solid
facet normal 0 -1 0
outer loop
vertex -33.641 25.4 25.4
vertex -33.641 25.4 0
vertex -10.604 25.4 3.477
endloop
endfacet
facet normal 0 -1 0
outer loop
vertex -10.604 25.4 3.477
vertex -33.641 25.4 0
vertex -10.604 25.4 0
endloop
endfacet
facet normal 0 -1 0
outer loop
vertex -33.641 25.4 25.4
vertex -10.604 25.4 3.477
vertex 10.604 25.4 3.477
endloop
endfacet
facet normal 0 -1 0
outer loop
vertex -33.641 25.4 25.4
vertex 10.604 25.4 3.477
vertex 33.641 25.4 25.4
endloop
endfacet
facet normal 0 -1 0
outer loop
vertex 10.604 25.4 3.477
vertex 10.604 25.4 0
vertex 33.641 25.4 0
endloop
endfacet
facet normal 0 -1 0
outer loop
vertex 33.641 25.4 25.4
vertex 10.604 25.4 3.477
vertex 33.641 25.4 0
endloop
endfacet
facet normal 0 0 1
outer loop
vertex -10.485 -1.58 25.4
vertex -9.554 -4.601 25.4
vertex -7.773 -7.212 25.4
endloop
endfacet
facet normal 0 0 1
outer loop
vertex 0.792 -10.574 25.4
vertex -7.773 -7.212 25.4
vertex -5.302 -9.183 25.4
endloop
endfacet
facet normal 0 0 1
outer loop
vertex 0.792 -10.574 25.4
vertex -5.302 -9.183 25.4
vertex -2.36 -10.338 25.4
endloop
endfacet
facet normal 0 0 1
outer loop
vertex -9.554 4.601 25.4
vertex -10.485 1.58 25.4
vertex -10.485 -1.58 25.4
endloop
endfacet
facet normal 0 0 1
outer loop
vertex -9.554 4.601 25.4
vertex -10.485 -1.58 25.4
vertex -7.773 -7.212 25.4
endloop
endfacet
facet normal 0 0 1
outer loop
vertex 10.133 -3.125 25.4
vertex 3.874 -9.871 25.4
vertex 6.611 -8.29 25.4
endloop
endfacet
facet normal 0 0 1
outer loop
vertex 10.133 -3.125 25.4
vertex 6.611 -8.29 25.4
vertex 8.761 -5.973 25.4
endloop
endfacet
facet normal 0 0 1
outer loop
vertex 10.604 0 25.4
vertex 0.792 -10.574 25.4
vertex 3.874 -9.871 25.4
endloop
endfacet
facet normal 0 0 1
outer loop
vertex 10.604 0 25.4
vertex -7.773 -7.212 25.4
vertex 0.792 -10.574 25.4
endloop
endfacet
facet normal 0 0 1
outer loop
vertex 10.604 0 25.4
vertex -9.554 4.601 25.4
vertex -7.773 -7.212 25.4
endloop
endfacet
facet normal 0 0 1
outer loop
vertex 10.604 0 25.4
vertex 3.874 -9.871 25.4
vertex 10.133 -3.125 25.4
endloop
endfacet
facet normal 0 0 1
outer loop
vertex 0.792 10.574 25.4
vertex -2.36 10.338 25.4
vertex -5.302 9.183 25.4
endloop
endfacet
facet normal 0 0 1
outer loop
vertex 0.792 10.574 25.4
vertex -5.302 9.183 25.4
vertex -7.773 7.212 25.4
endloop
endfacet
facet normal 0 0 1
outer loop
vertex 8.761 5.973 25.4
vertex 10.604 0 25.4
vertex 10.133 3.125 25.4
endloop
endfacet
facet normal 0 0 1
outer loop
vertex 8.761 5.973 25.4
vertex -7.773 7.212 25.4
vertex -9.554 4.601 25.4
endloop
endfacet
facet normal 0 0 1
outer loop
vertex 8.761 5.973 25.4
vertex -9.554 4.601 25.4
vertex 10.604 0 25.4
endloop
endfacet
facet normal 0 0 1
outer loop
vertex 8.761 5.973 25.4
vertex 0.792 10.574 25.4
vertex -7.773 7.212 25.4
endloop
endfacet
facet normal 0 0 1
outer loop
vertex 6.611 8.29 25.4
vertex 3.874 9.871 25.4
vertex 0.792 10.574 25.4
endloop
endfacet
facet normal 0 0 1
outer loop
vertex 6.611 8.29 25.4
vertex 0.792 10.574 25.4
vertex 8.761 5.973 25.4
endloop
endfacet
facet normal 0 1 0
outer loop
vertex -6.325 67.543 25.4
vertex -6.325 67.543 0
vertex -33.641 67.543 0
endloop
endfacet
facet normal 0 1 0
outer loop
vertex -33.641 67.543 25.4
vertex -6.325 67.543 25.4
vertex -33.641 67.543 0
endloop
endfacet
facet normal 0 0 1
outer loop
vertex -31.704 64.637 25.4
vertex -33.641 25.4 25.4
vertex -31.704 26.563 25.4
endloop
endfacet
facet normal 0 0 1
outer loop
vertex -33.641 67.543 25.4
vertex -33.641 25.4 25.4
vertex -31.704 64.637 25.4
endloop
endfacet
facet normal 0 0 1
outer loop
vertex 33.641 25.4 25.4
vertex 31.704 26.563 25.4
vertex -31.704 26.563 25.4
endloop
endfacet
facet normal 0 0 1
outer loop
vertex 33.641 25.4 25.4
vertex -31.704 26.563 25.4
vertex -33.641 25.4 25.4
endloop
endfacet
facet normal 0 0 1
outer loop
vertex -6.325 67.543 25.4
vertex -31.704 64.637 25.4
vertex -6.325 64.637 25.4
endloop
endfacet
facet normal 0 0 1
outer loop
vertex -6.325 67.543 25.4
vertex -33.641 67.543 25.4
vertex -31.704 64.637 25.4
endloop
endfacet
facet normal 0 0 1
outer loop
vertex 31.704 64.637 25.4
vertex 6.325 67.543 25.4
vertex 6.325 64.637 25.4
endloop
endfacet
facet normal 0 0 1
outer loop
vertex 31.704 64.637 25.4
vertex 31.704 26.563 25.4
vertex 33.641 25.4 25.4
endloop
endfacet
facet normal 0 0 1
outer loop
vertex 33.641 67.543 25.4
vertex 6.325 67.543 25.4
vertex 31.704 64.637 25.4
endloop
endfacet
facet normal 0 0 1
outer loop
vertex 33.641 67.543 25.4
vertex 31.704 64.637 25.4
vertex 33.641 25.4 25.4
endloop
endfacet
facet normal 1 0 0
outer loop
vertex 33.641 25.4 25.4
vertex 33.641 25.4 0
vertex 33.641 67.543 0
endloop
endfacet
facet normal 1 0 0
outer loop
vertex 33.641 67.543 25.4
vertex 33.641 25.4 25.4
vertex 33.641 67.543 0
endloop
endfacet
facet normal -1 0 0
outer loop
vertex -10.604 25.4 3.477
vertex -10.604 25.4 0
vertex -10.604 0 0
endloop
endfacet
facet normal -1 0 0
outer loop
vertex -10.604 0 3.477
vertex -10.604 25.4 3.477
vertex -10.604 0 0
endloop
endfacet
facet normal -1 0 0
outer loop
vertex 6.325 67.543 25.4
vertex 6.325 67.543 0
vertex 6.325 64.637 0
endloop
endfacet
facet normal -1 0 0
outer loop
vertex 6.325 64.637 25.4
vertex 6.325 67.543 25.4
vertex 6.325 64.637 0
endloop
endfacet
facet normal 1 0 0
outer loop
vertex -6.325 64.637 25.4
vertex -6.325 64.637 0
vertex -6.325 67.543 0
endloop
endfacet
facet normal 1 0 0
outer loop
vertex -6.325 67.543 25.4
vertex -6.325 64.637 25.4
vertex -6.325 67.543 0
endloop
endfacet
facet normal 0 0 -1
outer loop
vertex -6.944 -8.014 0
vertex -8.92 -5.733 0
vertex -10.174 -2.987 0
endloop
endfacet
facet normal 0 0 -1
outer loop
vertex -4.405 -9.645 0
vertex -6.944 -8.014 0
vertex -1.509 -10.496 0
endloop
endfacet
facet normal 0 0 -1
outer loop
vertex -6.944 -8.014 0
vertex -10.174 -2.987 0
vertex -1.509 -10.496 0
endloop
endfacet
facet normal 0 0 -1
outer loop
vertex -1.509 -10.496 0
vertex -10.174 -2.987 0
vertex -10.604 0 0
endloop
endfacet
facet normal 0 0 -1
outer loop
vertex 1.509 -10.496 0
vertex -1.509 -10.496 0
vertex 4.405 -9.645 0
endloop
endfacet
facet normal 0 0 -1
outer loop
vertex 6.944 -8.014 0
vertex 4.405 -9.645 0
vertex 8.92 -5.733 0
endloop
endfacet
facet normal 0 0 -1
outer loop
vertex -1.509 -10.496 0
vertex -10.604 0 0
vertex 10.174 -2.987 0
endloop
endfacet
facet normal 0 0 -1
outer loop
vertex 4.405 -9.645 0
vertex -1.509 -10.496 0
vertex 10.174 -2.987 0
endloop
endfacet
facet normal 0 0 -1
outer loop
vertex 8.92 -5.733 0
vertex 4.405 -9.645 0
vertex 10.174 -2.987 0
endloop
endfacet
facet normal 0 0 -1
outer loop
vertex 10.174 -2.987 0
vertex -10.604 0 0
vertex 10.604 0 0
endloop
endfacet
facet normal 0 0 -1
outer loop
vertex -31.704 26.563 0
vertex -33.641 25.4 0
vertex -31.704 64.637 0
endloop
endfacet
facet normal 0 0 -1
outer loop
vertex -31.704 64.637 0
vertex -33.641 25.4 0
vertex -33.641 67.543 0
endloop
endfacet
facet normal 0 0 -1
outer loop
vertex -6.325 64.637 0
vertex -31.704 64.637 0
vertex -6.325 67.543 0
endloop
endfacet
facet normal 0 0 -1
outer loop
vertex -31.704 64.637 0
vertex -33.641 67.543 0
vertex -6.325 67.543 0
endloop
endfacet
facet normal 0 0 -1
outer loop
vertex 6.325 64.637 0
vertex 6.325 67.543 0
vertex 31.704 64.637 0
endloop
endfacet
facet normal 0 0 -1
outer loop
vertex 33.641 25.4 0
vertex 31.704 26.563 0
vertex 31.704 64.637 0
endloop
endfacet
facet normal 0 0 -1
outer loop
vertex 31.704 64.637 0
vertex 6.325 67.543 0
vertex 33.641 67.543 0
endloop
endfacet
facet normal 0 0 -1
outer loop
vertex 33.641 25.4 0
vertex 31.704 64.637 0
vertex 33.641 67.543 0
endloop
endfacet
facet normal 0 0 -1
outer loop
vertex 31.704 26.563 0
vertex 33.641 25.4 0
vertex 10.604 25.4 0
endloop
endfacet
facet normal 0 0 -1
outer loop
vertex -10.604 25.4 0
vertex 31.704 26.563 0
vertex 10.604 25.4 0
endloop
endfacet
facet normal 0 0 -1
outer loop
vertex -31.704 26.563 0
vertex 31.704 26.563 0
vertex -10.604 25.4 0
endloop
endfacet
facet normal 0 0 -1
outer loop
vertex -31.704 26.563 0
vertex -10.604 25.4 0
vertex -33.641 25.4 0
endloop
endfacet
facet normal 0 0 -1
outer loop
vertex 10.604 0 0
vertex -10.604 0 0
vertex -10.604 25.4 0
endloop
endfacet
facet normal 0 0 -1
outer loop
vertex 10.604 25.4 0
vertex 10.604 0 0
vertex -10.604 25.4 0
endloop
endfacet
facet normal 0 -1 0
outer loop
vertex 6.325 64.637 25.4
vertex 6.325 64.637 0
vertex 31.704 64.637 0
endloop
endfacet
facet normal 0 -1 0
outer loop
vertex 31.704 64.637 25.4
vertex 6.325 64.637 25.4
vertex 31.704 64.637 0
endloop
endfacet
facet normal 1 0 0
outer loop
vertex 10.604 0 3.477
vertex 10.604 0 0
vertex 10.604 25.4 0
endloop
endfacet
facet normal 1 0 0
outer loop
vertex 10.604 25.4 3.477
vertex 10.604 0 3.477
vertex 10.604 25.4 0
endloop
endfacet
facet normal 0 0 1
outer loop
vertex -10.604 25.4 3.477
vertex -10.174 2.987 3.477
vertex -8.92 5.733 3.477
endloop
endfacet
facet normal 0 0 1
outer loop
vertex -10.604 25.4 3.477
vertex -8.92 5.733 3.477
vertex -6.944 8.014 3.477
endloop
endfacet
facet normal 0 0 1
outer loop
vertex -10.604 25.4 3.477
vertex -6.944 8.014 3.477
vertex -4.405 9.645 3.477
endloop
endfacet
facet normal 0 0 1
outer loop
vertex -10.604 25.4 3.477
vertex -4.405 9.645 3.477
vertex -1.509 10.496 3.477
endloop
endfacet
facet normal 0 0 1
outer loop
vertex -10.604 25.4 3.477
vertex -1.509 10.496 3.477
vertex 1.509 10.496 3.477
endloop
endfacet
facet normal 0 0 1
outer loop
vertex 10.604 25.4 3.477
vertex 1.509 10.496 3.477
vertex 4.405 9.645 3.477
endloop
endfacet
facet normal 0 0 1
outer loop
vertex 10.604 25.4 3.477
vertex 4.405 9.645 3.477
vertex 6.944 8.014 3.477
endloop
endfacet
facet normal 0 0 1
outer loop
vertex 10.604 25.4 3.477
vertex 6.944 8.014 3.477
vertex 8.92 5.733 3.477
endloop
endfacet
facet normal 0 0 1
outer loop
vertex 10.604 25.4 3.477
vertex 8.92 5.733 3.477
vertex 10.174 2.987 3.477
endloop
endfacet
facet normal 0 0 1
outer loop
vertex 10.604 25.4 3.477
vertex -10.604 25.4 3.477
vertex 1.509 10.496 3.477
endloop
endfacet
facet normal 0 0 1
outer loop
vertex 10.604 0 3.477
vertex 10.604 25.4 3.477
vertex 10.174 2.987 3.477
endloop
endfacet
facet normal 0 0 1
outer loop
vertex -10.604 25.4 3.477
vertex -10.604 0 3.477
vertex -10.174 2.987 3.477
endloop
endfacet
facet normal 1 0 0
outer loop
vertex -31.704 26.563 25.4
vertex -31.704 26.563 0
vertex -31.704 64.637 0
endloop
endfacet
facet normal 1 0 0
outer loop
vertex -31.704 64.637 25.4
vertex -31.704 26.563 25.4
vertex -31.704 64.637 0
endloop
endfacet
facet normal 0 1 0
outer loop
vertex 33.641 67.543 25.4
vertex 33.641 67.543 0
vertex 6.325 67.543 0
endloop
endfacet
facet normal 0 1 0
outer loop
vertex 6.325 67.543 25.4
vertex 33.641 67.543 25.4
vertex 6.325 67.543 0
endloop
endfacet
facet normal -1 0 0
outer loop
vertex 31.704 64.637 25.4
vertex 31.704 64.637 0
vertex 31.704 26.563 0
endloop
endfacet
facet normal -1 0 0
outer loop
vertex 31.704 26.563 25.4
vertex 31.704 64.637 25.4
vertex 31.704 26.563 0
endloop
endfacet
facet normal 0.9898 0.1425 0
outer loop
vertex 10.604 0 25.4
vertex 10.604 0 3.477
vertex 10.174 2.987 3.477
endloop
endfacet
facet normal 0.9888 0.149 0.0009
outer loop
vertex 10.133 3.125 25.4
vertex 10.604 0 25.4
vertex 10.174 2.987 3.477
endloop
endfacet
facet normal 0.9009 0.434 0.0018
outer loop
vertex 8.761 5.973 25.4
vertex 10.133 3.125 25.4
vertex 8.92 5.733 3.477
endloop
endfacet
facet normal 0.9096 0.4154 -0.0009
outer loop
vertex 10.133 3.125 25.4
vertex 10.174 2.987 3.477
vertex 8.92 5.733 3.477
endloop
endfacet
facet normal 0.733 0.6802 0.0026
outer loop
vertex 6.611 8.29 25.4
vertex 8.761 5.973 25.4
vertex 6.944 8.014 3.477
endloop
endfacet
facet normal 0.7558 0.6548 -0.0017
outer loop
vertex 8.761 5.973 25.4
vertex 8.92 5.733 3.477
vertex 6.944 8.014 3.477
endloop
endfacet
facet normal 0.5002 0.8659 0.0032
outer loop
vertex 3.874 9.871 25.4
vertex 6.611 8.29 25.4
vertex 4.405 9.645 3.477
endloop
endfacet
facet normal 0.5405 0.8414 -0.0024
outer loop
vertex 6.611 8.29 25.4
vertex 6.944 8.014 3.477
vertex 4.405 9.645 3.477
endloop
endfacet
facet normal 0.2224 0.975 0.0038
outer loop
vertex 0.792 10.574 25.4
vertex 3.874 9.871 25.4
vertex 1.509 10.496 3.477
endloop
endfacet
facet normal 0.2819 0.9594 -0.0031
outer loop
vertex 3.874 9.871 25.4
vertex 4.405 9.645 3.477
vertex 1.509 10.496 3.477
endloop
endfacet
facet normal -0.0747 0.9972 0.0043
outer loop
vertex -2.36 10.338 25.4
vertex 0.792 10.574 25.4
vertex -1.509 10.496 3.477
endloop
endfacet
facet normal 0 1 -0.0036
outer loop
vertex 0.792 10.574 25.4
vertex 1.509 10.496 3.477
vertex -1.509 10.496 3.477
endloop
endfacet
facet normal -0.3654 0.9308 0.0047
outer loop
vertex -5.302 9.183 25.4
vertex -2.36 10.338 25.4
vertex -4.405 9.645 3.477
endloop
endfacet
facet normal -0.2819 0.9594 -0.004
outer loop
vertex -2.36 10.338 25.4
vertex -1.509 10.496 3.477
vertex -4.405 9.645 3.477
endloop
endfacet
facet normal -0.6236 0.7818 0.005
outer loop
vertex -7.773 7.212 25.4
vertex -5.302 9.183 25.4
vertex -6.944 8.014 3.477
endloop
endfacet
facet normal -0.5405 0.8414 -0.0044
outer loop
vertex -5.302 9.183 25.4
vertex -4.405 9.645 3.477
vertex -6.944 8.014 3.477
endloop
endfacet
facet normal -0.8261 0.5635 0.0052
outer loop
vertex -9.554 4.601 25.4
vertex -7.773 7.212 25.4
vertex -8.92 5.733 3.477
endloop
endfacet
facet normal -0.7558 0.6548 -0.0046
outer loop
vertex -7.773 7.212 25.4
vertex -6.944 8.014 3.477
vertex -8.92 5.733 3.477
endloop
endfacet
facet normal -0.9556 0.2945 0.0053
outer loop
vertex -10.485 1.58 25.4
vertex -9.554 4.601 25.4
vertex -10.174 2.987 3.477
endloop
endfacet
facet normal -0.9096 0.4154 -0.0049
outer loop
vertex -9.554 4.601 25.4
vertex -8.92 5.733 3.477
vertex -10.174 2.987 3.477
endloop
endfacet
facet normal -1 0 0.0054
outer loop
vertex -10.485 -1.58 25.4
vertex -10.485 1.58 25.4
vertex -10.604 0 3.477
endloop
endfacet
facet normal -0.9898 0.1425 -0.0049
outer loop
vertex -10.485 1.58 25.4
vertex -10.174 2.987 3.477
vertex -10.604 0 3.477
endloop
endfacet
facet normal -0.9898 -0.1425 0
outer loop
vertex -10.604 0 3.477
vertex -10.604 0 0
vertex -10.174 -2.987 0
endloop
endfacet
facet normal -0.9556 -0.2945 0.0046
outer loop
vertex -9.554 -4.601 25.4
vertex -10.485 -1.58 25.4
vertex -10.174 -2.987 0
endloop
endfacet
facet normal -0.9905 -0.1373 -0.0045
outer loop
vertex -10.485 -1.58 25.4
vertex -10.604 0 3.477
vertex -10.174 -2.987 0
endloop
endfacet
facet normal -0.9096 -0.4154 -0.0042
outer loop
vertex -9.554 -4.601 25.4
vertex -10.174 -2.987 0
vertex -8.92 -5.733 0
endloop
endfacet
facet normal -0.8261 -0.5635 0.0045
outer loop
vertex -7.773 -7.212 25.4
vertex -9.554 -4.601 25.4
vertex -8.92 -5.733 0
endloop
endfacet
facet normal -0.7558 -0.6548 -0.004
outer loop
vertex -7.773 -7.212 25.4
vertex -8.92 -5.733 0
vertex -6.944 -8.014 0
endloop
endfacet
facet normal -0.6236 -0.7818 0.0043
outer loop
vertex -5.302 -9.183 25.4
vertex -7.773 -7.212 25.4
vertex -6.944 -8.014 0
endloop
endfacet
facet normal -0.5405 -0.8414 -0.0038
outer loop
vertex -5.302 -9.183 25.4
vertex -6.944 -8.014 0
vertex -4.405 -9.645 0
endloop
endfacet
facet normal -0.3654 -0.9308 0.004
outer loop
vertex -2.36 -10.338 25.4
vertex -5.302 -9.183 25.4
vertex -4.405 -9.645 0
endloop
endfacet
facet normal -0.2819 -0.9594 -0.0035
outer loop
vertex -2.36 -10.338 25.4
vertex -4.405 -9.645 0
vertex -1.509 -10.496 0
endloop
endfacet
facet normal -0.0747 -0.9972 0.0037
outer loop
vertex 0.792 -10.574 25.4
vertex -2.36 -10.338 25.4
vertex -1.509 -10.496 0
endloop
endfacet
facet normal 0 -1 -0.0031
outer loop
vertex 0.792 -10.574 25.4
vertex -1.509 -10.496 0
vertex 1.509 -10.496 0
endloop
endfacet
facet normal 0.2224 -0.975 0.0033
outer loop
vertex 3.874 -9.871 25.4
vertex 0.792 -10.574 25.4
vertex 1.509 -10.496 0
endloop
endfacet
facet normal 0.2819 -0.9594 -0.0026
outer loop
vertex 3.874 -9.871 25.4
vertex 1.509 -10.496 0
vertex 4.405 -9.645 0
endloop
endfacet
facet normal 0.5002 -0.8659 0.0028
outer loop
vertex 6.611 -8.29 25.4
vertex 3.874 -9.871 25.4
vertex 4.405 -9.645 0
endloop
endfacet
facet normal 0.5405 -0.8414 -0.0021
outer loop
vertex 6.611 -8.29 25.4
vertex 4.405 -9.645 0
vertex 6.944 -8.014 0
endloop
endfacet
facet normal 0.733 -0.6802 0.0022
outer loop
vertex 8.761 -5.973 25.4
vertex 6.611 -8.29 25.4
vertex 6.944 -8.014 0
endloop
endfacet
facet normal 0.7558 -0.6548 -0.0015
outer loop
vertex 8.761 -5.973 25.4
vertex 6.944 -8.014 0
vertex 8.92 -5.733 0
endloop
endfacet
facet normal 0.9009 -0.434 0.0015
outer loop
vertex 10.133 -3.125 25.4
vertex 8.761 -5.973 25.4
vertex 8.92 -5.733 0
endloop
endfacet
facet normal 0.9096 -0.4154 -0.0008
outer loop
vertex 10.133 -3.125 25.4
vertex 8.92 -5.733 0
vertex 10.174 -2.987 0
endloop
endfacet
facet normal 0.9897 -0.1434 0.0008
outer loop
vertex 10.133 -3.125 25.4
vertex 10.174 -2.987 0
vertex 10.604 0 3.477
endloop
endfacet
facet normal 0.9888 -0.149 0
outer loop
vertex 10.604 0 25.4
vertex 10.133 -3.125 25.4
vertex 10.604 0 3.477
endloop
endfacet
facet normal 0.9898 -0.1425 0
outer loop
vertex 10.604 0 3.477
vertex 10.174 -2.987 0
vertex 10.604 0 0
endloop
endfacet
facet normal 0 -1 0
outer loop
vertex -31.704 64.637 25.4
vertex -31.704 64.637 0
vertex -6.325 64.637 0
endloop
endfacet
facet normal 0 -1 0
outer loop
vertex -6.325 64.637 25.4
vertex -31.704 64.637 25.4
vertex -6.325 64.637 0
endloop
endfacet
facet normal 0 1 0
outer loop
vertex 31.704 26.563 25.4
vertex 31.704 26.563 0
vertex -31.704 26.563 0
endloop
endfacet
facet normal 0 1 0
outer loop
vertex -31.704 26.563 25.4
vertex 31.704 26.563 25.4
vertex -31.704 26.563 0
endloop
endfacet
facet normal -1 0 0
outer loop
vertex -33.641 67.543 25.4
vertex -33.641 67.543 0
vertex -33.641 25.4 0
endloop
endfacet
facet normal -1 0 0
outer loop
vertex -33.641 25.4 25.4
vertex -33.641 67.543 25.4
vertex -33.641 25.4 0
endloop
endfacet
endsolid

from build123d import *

# Parameters (mm, degrees)
SKETCH1_R             = 10.603707514
BOSS_EXTRUDE1_DEPTH   = 25.4
BOSS_EXTRUDE1_2_DEPTH = 25.4
BOSS_EXTRUDE3_DEPTH   = 3.47673544


with BuildPart() as part:
    # Sketch1 → Boss-Extrude1 (new body)
    with BuildSketch(Plane.XY):
        Circle(SKETCH1_R)
    extrude(amount=BOSS_EXTRUDE1_DEPTH)



with BuildPart() as body_2:
    # Sketch1 → Boss-Extrude1 2 (new body)
    with BuildSketch(Plane.XY):
        Polygon((-33.640809115, 67.542598602), (-33.640809115, 25.4), (33.640809115, 25.4), (33.640809115, 67.542598602), (6.3246, 67.542598602), (6.3246, 64.637417314), (31.70428, 64.637417314), (31.70428, 26.562817314), (-31.70428, 26.562817314), (-31.70428, 64.637417314), (-6.3246, 64.637417314), (-6.3246, 67.542598602), align=None)
    extrude(amount=BOSS_EXTRUDE1_2_DEPTH)


with BuildPart() as part_1:
    add(part.part)

    add(body_2.part)  # Boss-Extrude3 merges body 2
    # Sketch3 → Boss-Extrude3 (add)
    with BuildSketch(Plane(origin=(0, 0, 0), x_dir=(-1, 0, 0), z_dir=(0, 0, -1))):
        with BuildLine():
            Line((-10.603707514, 0), (-10.603707514, 25.4))
            Line((-10.603707514, 25.4), (10.603707514, 25.4))
            Line((10.603707514, 25.4), (10.603707514, 0))
            ThreePointArc((10.603707514, 0), (0, -10.603707514), (-10.603707514, 0))
        make_face()
    extrude(amount=-BOSS_EXTRUDE3_DEPTH)


solid = part_1.part
